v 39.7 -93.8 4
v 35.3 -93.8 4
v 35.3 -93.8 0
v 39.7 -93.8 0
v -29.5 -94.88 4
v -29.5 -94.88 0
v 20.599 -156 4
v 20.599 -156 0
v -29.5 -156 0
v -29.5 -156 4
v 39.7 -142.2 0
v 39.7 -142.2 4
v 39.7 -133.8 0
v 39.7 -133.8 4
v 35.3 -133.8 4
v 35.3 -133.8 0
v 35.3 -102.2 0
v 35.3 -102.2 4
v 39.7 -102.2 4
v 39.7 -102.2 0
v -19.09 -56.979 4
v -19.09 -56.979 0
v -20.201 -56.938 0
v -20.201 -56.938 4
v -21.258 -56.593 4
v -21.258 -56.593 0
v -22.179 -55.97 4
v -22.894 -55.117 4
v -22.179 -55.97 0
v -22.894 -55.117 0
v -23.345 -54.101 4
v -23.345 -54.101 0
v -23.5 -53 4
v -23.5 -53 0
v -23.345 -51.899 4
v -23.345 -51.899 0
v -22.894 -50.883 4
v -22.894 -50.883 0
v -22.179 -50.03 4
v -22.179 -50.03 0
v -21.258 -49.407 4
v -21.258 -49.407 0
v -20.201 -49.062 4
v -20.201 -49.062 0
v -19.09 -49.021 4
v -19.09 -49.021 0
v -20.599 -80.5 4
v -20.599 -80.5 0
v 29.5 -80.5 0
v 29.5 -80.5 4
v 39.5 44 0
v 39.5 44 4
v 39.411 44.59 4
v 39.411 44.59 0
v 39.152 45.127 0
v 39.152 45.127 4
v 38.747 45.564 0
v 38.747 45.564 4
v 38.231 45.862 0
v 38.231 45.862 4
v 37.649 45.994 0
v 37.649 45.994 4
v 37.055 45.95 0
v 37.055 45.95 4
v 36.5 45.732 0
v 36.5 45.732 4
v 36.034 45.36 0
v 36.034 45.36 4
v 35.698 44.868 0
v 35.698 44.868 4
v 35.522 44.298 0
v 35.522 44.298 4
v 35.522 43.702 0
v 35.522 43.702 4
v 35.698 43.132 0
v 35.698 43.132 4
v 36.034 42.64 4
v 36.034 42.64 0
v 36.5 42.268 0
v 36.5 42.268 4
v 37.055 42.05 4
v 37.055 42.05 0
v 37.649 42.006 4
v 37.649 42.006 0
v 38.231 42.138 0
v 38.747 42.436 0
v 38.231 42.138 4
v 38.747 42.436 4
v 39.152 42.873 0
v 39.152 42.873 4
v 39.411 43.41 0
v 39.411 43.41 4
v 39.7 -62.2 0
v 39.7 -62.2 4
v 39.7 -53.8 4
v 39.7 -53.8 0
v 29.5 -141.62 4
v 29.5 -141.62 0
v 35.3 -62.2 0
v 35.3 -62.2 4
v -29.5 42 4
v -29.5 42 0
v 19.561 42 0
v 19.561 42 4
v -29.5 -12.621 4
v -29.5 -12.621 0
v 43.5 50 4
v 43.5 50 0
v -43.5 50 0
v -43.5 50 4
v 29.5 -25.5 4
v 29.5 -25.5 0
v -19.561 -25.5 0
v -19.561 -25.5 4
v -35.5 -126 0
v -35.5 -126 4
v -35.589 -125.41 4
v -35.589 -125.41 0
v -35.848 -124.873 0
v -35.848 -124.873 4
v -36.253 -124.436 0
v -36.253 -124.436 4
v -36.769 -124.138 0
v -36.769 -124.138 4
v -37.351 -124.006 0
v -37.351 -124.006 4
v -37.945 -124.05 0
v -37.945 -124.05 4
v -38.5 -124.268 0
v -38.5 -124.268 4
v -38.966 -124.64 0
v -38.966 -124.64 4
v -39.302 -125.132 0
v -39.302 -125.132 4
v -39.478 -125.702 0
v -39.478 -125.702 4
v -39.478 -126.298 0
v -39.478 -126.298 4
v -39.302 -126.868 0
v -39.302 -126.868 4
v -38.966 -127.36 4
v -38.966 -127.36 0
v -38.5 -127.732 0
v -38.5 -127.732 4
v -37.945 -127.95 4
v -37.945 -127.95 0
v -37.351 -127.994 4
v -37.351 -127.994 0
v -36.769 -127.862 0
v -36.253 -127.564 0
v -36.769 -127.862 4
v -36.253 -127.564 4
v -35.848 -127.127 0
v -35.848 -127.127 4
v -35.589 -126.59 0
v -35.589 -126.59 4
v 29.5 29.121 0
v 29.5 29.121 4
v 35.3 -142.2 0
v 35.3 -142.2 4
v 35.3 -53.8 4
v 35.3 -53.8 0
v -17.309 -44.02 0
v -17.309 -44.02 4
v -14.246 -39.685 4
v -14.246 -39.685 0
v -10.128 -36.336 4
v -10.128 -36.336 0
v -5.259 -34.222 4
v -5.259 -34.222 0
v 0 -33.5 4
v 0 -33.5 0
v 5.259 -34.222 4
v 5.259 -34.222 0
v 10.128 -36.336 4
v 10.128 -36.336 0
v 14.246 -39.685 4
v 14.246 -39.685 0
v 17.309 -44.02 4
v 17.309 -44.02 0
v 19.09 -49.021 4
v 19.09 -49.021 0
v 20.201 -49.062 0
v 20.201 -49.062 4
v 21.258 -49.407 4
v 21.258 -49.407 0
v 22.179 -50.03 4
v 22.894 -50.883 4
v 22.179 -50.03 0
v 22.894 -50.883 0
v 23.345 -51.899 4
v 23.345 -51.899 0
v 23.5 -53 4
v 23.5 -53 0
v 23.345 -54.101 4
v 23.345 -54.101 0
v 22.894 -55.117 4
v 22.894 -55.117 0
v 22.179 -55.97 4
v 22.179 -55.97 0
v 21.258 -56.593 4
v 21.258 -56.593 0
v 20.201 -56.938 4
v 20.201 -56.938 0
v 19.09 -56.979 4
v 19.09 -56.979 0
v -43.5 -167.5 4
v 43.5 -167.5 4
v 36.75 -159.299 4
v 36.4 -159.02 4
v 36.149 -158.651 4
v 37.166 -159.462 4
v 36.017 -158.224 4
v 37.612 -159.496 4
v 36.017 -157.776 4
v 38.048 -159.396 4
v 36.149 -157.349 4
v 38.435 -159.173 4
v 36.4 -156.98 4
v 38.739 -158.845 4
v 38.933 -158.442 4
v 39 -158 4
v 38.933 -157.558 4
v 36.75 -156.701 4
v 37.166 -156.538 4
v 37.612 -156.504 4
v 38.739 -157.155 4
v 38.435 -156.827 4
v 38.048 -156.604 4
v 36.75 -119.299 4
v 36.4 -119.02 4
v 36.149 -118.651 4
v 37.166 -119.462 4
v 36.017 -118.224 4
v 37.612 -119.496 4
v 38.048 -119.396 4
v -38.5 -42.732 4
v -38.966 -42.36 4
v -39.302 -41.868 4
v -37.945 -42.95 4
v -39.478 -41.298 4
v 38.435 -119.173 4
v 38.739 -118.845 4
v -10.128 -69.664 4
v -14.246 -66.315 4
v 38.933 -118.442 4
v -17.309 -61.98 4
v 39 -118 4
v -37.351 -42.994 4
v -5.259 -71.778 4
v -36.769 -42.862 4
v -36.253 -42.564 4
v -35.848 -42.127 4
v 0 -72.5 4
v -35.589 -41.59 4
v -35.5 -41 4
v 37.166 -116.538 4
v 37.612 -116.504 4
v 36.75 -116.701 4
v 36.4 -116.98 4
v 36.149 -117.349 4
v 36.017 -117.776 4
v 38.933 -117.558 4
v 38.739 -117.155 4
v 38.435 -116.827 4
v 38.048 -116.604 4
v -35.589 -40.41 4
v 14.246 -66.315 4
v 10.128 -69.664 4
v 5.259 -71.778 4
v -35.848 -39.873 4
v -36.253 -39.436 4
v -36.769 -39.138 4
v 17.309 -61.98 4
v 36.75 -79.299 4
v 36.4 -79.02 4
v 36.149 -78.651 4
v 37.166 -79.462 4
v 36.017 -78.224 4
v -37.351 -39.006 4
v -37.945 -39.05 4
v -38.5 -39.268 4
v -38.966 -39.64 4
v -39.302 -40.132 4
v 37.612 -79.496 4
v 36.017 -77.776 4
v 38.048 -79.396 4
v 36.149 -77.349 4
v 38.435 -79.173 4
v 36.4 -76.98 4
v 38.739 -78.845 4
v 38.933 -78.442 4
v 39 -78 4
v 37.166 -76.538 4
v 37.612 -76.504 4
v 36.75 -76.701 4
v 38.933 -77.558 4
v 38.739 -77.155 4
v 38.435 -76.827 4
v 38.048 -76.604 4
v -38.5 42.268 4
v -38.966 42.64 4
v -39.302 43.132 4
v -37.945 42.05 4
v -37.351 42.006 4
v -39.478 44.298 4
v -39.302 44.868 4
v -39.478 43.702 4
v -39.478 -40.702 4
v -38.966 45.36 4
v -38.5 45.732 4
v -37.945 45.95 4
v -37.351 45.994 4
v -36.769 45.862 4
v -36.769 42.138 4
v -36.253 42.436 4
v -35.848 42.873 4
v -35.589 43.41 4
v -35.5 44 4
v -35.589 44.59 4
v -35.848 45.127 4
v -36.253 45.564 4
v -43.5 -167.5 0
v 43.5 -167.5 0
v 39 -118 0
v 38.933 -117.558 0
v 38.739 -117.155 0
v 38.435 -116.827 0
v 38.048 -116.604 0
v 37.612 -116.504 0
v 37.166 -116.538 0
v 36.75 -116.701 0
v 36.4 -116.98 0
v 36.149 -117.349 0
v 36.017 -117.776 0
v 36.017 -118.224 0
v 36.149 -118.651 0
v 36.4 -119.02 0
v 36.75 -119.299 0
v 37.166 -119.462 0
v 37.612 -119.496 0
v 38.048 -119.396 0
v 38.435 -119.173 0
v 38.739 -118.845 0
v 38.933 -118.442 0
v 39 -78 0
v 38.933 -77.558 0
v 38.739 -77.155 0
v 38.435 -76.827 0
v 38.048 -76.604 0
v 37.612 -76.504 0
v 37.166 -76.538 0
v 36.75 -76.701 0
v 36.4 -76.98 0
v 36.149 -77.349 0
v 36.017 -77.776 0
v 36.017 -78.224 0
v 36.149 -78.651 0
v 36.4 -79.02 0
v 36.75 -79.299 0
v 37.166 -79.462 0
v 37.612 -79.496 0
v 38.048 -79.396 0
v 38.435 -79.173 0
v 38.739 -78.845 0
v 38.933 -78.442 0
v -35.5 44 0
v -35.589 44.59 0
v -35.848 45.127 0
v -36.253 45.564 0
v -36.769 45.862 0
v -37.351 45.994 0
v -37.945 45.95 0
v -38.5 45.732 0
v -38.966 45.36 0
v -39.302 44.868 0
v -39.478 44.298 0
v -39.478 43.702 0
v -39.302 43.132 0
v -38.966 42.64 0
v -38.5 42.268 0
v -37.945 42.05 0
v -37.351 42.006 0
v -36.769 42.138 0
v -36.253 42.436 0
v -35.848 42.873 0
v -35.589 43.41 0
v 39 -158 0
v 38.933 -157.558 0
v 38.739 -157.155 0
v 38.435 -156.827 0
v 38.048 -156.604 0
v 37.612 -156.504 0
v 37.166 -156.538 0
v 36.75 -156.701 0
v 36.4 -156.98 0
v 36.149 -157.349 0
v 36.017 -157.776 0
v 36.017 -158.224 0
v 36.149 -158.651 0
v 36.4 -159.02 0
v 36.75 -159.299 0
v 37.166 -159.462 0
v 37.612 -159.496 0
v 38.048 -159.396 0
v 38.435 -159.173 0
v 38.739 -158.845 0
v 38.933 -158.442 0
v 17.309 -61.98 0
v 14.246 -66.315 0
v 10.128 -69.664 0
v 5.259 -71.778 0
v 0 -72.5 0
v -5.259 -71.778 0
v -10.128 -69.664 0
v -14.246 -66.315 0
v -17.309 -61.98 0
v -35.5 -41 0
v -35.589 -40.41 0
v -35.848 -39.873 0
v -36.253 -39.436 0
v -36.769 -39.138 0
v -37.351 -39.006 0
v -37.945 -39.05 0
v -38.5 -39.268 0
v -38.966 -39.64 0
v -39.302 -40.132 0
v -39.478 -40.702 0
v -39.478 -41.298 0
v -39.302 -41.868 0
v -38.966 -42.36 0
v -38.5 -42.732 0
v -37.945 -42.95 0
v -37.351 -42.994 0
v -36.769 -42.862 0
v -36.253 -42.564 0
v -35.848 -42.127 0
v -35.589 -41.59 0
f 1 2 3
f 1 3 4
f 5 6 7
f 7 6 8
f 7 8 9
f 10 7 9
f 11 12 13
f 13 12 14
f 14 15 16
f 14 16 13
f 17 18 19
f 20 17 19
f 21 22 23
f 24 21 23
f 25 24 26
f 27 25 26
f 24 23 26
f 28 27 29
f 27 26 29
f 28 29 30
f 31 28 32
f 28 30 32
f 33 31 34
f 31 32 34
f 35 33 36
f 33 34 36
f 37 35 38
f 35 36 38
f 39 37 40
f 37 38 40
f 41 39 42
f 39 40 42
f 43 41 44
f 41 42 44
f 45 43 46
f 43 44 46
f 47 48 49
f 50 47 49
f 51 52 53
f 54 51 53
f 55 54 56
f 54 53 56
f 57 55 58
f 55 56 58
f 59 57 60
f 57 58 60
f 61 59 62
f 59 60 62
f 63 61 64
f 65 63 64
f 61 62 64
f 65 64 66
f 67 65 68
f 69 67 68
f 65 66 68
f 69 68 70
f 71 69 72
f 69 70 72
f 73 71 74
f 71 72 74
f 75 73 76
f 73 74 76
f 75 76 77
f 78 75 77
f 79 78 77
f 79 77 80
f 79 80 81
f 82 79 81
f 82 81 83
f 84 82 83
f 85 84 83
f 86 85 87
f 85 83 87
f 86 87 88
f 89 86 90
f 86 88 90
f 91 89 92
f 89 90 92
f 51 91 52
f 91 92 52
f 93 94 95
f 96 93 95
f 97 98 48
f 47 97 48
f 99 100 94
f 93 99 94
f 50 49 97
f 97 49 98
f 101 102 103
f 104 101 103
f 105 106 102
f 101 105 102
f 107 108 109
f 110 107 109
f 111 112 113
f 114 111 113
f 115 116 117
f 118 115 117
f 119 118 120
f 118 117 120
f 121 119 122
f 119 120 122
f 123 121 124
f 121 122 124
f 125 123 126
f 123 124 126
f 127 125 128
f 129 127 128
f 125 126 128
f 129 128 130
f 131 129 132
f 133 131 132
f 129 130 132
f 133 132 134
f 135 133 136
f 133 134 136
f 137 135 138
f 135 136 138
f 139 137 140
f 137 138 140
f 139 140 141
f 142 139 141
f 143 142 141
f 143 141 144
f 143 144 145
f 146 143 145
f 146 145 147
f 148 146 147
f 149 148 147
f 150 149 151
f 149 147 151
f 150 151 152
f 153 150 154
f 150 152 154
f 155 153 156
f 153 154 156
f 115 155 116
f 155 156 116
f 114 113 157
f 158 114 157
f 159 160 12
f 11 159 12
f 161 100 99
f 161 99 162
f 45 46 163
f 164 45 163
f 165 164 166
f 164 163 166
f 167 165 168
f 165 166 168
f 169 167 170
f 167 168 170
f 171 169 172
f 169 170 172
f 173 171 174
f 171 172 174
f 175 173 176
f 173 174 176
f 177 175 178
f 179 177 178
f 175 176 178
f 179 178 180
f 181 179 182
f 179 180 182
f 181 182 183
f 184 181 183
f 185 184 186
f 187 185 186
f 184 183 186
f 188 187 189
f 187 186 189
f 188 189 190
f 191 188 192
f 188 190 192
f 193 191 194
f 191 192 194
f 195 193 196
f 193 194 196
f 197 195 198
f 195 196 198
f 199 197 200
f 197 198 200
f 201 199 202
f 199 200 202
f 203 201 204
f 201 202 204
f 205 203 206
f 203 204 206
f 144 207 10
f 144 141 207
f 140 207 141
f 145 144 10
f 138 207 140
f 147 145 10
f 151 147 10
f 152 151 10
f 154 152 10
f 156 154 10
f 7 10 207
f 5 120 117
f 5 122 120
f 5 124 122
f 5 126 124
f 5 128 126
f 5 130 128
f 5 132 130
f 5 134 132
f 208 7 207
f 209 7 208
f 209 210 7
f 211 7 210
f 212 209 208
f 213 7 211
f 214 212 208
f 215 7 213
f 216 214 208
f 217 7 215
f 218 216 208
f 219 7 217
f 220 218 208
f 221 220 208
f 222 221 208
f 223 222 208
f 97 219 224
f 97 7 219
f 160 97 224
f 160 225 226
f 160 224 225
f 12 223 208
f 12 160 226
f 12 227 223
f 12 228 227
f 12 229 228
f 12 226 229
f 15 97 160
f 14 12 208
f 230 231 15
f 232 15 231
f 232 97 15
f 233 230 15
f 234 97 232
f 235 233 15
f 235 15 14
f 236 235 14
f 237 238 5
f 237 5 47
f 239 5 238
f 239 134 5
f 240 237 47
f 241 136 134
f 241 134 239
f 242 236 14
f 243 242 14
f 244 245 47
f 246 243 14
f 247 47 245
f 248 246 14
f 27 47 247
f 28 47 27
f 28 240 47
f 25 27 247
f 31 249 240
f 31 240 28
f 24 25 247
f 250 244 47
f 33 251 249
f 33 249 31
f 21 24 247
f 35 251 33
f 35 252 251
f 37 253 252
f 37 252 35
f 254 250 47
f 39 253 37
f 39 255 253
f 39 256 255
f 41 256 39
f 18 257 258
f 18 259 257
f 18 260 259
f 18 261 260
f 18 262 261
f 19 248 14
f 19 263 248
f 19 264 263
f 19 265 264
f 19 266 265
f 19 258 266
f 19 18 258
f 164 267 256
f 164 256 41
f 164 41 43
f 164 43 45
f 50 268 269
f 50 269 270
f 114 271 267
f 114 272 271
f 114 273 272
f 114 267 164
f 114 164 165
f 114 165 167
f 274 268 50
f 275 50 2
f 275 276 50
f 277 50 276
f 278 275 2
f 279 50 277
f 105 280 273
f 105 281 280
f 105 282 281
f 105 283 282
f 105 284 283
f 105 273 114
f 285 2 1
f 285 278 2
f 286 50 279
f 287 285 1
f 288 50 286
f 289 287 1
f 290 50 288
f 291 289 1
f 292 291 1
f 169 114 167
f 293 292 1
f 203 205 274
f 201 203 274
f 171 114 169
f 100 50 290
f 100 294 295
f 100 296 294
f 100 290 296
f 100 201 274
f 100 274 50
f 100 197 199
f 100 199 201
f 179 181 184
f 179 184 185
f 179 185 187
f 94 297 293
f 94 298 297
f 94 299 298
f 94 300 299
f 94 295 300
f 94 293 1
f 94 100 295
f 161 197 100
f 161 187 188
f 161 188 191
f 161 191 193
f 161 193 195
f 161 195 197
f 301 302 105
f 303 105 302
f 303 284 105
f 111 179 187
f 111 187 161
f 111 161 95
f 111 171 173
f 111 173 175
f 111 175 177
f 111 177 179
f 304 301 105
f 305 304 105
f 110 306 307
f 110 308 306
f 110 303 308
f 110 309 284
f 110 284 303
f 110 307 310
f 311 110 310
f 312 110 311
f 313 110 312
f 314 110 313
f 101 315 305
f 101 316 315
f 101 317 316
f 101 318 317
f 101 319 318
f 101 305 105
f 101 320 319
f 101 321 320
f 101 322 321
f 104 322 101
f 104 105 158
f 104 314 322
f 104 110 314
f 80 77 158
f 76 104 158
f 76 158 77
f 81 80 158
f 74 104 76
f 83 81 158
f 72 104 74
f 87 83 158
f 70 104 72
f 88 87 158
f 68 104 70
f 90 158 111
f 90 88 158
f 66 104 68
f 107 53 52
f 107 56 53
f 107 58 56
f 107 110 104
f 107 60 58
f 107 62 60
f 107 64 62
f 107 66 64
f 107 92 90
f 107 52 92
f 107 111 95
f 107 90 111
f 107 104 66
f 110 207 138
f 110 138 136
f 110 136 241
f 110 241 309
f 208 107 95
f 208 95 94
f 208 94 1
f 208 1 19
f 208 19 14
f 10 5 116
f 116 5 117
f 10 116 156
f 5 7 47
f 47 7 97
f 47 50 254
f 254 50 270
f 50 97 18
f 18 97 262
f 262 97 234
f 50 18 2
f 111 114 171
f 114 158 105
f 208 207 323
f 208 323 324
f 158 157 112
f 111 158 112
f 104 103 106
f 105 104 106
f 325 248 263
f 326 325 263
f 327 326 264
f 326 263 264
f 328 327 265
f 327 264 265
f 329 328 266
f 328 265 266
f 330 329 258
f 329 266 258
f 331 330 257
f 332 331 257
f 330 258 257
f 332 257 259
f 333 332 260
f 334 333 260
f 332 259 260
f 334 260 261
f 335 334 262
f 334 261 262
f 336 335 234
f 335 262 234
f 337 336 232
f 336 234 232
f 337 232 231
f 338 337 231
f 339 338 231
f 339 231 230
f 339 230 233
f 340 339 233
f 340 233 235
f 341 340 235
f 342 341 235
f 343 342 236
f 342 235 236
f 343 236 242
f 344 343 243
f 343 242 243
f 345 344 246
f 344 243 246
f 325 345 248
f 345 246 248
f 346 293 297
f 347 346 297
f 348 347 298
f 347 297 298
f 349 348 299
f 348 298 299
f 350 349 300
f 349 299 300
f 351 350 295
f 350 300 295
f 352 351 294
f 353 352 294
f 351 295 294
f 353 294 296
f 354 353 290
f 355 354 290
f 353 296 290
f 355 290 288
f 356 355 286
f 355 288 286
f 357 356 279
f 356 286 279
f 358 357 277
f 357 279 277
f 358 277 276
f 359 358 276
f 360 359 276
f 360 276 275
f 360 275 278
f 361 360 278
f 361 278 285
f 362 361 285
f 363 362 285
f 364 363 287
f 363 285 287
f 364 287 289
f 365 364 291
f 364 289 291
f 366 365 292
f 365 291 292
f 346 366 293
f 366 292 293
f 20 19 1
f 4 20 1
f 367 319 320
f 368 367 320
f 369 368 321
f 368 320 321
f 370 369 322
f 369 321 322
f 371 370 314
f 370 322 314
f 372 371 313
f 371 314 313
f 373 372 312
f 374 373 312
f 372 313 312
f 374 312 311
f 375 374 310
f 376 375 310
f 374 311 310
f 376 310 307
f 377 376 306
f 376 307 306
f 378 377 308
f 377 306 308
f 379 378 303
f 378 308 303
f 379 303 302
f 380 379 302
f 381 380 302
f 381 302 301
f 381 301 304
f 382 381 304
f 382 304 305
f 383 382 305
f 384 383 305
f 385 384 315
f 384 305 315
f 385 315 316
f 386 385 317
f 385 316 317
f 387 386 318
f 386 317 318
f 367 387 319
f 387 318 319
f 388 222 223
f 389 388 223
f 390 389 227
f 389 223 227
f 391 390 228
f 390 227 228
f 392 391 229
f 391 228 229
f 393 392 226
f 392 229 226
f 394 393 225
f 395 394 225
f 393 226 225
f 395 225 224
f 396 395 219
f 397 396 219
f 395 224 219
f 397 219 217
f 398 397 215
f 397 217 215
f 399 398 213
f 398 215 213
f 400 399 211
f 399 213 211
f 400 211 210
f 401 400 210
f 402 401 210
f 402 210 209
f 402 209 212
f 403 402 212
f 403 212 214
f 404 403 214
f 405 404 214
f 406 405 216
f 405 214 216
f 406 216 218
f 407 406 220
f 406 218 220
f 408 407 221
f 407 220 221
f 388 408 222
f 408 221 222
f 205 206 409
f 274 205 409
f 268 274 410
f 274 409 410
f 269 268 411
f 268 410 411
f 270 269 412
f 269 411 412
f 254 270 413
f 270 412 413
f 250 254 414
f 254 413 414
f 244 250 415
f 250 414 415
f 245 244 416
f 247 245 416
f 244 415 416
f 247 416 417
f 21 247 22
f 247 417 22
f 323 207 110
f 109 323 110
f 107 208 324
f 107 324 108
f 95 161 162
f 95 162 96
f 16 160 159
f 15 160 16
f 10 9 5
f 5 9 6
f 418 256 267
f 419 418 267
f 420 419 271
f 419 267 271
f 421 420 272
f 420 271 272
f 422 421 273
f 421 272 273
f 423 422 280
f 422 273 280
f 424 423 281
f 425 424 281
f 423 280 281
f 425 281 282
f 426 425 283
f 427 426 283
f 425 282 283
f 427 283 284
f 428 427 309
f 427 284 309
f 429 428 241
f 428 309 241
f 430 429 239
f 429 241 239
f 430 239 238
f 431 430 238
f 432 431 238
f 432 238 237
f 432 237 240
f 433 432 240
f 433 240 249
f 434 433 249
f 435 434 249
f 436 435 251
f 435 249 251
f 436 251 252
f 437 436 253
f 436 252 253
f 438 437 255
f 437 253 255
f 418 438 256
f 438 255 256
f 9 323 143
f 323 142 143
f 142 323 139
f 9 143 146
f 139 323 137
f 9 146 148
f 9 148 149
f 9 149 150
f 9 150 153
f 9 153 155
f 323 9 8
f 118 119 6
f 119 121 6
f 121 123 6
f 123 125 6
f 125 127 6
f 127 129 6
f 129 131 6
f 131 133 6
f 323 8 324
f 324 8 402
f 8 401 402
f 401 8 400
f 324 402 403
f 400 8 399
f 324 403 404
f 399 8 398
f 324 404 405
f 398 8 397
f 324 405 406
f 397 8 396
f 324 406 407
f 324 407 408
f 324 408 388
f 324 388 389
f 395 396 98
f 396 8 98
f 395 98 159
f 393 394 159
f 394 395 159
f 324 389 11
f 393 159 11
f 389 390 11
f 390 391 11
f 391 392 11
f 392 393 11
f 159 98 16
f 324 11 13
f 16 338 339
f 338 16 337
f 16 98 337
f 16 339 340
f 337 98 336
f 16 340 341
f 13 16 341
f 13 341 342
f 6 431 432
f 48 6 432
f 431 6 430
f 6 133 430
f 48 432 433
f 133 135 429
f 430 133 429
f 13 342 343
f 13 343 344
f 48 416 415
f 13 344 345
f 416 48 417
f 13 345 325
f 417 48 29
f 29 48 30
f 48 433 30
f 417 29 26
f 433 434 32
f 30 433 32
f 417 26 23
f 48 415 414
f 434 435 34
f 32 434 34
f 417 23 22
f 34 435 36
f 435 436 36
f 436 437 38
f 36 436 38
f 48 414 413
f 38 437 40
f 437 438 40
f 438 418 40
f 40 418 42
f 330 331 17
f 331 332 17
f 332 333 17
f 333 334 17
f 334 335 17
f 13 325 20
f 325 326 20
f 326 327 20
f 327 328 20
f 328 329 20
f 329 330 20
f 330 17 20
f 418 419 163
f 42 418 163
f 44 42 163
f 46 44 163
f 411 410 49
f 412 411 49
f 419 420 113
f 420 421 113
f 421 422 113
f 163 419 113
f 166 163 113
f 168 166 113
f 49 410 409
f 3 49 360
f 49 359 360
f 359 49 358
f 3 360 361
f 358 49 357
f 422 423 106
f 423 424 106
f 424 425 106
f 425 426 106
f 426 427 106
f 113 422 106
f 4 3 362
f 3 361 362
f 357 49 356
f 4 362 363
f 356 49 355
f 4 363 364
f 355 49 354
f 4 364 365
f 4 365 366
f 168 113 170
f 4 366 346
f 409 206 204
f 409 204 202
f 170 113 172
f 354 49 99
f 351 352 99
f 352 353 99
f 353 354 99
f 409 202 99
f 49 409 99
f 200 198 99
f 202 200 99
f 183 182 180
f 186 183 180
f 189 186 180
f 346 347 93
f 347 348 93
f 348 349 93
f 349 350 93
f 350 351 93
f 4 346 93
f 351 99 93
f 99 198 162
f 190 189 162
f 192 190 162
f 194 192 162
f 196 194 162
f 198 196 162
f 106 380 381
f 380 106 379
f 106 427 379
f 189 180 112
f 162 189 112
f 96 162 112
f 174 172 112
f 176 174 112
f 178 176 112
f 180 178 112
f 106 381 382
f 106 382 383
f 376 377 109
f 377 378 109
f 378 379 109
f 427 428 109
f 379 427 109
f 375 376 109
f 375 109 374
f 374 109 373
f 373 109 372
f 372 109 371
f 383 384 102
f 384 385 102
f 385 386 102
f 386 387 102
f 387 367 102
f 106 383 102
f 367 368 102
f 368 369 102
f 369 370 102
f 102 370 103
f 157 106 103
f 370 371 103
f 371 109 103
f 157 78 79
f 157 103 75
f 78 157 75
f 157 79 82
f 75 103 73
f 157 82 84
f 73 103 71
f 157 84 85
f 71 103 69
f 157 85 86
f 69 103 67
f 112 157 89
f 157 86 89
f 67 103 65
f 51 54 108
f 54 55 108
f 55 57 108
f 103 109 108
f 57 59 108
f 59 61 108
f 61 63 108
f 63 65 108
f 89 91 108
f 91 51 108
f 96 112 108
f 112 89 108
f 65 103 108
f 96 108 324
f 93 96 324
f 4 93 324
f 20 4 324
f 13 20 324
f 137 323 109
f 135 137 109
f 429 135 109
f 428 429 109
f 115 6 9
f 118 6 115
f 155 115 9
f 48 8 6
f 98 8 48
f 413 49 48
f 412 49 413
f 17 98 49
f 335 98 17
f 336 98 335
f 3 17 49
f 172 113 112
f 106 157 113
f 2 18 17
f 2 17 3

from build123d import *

# Parameters (mm, degrees)
EXTRUDE_1_DEPTH     = 4
SKETCH_2_R          = 1.5
SKETCH_2_R_2        = 2
SKETCH_2_W          = 4.4
SKETCH_2_H          = 8.4
CUT_EXTRUDE_1_DEPTH = 4
SKETCH_3_W          = 87
SKETCH_3_H          = 3.5
EXTRUDE_2_DEPTH     = 4


with BuildPart() as part:
    # 草图1 → 凸台-拉伸1 (new body)
    with BuildSketch(Plane.XY):
        Polygon((37.5, 50), (-37.5, 50), (-43.5, 50), (-43.5, -57), (-43.5, -164), (-37.5, -164), (37.5, -164), (43.5, -164), (43.5, -57), (43.5, 50), align=None)
        Polygon((-29.5, -156), (-29.5, -94.879730583), (20.598581489, -156), align=None, mode=Mode.SUBTRACT)
        Polygon((-20.598581489, -80.5), (29.5, -80.5), (29.5, -141.620269417), align=None, mode=Mode.SUBTRACT)
        with BuildLine():
            ThreePointArc((-19.08974359, -49.021094412), (0, -33.5), (19.08974359, -49.021094412))
            ThreePointArc((19.08974359, -49.021094412), (23.5, -53), (19.08974359, -56.978905588))
            ThreePointArc((19.08974359, -56.978905588), (0, -72.5), (-19.08974359, -56.978905588))
            ThreePointArc((-19.08974359, -56.978905588), (-23.5, -53), (-19.08974359, -49.021094412))
        make_face(mode=Mode.SUBTRACT)
        Polygon((-29.5, 42), (19.561080579, 42), (-29.5, -12.621336377), align=None, mode=Mode.SUBTRACT)
        Polygon((-19.561080579, -25.5), (29.5, 29.121336377), (29.5, -25.5), align=None, mode=Mode.SUBTRACT)
    extrude(amount=EXTRUDE_1_DEPTH)

    # 草图2 → 切除-拉伸1 (cut)
    with BuildSketch(Plane.XY.offset(4)):
        with Locations((37.5, -158)):
            Circle(SKETCH_2_R)
        with Locations((37.5, -78)):
            Circle(SKETCH_2_R)
        with Locations((37.5, -118)):
            Circle(SKETCH_2_R)
        with Locations((37.5, 44)):
            Circle(SKETCH_2_R_2)
        with Locations((-37.5, 44)):
            Circle(SKETCH_2_R_2)
        with Locations((-37.5, -41)):
            Circle(SKETCH_2_R_2)
        with Locations((-37.5, -126)):
            Circle(SKETCH_2_R_2)
        with Locations((37.5, -138)):
            Rectangle(SKETCH_2_W, SKETCH_2_H)
        with Locations((37.5, -98)):
            Rectangle(SKETCH_2_W, SKETCH_2_H)
        with Locations((37.5, -58)):
            Rectangle(SKETCH_2_W, SKETCH_2_H)
    extrude(amount=-CUT_EXTRUDE_1_DEPTH, mode=Mode.SUBTRACT)

    # 草图3 → 凸台-拉伸2 (add)
    with BuildSketch(Plane.XY.offset(4)):
        with Locations((0, -165.75)):
            Rectangle(SKETCH_3_W, SKETCH_3_H)
    extrude(amount=-EXTRUDE_2_DEPTH)


solid = part.part
